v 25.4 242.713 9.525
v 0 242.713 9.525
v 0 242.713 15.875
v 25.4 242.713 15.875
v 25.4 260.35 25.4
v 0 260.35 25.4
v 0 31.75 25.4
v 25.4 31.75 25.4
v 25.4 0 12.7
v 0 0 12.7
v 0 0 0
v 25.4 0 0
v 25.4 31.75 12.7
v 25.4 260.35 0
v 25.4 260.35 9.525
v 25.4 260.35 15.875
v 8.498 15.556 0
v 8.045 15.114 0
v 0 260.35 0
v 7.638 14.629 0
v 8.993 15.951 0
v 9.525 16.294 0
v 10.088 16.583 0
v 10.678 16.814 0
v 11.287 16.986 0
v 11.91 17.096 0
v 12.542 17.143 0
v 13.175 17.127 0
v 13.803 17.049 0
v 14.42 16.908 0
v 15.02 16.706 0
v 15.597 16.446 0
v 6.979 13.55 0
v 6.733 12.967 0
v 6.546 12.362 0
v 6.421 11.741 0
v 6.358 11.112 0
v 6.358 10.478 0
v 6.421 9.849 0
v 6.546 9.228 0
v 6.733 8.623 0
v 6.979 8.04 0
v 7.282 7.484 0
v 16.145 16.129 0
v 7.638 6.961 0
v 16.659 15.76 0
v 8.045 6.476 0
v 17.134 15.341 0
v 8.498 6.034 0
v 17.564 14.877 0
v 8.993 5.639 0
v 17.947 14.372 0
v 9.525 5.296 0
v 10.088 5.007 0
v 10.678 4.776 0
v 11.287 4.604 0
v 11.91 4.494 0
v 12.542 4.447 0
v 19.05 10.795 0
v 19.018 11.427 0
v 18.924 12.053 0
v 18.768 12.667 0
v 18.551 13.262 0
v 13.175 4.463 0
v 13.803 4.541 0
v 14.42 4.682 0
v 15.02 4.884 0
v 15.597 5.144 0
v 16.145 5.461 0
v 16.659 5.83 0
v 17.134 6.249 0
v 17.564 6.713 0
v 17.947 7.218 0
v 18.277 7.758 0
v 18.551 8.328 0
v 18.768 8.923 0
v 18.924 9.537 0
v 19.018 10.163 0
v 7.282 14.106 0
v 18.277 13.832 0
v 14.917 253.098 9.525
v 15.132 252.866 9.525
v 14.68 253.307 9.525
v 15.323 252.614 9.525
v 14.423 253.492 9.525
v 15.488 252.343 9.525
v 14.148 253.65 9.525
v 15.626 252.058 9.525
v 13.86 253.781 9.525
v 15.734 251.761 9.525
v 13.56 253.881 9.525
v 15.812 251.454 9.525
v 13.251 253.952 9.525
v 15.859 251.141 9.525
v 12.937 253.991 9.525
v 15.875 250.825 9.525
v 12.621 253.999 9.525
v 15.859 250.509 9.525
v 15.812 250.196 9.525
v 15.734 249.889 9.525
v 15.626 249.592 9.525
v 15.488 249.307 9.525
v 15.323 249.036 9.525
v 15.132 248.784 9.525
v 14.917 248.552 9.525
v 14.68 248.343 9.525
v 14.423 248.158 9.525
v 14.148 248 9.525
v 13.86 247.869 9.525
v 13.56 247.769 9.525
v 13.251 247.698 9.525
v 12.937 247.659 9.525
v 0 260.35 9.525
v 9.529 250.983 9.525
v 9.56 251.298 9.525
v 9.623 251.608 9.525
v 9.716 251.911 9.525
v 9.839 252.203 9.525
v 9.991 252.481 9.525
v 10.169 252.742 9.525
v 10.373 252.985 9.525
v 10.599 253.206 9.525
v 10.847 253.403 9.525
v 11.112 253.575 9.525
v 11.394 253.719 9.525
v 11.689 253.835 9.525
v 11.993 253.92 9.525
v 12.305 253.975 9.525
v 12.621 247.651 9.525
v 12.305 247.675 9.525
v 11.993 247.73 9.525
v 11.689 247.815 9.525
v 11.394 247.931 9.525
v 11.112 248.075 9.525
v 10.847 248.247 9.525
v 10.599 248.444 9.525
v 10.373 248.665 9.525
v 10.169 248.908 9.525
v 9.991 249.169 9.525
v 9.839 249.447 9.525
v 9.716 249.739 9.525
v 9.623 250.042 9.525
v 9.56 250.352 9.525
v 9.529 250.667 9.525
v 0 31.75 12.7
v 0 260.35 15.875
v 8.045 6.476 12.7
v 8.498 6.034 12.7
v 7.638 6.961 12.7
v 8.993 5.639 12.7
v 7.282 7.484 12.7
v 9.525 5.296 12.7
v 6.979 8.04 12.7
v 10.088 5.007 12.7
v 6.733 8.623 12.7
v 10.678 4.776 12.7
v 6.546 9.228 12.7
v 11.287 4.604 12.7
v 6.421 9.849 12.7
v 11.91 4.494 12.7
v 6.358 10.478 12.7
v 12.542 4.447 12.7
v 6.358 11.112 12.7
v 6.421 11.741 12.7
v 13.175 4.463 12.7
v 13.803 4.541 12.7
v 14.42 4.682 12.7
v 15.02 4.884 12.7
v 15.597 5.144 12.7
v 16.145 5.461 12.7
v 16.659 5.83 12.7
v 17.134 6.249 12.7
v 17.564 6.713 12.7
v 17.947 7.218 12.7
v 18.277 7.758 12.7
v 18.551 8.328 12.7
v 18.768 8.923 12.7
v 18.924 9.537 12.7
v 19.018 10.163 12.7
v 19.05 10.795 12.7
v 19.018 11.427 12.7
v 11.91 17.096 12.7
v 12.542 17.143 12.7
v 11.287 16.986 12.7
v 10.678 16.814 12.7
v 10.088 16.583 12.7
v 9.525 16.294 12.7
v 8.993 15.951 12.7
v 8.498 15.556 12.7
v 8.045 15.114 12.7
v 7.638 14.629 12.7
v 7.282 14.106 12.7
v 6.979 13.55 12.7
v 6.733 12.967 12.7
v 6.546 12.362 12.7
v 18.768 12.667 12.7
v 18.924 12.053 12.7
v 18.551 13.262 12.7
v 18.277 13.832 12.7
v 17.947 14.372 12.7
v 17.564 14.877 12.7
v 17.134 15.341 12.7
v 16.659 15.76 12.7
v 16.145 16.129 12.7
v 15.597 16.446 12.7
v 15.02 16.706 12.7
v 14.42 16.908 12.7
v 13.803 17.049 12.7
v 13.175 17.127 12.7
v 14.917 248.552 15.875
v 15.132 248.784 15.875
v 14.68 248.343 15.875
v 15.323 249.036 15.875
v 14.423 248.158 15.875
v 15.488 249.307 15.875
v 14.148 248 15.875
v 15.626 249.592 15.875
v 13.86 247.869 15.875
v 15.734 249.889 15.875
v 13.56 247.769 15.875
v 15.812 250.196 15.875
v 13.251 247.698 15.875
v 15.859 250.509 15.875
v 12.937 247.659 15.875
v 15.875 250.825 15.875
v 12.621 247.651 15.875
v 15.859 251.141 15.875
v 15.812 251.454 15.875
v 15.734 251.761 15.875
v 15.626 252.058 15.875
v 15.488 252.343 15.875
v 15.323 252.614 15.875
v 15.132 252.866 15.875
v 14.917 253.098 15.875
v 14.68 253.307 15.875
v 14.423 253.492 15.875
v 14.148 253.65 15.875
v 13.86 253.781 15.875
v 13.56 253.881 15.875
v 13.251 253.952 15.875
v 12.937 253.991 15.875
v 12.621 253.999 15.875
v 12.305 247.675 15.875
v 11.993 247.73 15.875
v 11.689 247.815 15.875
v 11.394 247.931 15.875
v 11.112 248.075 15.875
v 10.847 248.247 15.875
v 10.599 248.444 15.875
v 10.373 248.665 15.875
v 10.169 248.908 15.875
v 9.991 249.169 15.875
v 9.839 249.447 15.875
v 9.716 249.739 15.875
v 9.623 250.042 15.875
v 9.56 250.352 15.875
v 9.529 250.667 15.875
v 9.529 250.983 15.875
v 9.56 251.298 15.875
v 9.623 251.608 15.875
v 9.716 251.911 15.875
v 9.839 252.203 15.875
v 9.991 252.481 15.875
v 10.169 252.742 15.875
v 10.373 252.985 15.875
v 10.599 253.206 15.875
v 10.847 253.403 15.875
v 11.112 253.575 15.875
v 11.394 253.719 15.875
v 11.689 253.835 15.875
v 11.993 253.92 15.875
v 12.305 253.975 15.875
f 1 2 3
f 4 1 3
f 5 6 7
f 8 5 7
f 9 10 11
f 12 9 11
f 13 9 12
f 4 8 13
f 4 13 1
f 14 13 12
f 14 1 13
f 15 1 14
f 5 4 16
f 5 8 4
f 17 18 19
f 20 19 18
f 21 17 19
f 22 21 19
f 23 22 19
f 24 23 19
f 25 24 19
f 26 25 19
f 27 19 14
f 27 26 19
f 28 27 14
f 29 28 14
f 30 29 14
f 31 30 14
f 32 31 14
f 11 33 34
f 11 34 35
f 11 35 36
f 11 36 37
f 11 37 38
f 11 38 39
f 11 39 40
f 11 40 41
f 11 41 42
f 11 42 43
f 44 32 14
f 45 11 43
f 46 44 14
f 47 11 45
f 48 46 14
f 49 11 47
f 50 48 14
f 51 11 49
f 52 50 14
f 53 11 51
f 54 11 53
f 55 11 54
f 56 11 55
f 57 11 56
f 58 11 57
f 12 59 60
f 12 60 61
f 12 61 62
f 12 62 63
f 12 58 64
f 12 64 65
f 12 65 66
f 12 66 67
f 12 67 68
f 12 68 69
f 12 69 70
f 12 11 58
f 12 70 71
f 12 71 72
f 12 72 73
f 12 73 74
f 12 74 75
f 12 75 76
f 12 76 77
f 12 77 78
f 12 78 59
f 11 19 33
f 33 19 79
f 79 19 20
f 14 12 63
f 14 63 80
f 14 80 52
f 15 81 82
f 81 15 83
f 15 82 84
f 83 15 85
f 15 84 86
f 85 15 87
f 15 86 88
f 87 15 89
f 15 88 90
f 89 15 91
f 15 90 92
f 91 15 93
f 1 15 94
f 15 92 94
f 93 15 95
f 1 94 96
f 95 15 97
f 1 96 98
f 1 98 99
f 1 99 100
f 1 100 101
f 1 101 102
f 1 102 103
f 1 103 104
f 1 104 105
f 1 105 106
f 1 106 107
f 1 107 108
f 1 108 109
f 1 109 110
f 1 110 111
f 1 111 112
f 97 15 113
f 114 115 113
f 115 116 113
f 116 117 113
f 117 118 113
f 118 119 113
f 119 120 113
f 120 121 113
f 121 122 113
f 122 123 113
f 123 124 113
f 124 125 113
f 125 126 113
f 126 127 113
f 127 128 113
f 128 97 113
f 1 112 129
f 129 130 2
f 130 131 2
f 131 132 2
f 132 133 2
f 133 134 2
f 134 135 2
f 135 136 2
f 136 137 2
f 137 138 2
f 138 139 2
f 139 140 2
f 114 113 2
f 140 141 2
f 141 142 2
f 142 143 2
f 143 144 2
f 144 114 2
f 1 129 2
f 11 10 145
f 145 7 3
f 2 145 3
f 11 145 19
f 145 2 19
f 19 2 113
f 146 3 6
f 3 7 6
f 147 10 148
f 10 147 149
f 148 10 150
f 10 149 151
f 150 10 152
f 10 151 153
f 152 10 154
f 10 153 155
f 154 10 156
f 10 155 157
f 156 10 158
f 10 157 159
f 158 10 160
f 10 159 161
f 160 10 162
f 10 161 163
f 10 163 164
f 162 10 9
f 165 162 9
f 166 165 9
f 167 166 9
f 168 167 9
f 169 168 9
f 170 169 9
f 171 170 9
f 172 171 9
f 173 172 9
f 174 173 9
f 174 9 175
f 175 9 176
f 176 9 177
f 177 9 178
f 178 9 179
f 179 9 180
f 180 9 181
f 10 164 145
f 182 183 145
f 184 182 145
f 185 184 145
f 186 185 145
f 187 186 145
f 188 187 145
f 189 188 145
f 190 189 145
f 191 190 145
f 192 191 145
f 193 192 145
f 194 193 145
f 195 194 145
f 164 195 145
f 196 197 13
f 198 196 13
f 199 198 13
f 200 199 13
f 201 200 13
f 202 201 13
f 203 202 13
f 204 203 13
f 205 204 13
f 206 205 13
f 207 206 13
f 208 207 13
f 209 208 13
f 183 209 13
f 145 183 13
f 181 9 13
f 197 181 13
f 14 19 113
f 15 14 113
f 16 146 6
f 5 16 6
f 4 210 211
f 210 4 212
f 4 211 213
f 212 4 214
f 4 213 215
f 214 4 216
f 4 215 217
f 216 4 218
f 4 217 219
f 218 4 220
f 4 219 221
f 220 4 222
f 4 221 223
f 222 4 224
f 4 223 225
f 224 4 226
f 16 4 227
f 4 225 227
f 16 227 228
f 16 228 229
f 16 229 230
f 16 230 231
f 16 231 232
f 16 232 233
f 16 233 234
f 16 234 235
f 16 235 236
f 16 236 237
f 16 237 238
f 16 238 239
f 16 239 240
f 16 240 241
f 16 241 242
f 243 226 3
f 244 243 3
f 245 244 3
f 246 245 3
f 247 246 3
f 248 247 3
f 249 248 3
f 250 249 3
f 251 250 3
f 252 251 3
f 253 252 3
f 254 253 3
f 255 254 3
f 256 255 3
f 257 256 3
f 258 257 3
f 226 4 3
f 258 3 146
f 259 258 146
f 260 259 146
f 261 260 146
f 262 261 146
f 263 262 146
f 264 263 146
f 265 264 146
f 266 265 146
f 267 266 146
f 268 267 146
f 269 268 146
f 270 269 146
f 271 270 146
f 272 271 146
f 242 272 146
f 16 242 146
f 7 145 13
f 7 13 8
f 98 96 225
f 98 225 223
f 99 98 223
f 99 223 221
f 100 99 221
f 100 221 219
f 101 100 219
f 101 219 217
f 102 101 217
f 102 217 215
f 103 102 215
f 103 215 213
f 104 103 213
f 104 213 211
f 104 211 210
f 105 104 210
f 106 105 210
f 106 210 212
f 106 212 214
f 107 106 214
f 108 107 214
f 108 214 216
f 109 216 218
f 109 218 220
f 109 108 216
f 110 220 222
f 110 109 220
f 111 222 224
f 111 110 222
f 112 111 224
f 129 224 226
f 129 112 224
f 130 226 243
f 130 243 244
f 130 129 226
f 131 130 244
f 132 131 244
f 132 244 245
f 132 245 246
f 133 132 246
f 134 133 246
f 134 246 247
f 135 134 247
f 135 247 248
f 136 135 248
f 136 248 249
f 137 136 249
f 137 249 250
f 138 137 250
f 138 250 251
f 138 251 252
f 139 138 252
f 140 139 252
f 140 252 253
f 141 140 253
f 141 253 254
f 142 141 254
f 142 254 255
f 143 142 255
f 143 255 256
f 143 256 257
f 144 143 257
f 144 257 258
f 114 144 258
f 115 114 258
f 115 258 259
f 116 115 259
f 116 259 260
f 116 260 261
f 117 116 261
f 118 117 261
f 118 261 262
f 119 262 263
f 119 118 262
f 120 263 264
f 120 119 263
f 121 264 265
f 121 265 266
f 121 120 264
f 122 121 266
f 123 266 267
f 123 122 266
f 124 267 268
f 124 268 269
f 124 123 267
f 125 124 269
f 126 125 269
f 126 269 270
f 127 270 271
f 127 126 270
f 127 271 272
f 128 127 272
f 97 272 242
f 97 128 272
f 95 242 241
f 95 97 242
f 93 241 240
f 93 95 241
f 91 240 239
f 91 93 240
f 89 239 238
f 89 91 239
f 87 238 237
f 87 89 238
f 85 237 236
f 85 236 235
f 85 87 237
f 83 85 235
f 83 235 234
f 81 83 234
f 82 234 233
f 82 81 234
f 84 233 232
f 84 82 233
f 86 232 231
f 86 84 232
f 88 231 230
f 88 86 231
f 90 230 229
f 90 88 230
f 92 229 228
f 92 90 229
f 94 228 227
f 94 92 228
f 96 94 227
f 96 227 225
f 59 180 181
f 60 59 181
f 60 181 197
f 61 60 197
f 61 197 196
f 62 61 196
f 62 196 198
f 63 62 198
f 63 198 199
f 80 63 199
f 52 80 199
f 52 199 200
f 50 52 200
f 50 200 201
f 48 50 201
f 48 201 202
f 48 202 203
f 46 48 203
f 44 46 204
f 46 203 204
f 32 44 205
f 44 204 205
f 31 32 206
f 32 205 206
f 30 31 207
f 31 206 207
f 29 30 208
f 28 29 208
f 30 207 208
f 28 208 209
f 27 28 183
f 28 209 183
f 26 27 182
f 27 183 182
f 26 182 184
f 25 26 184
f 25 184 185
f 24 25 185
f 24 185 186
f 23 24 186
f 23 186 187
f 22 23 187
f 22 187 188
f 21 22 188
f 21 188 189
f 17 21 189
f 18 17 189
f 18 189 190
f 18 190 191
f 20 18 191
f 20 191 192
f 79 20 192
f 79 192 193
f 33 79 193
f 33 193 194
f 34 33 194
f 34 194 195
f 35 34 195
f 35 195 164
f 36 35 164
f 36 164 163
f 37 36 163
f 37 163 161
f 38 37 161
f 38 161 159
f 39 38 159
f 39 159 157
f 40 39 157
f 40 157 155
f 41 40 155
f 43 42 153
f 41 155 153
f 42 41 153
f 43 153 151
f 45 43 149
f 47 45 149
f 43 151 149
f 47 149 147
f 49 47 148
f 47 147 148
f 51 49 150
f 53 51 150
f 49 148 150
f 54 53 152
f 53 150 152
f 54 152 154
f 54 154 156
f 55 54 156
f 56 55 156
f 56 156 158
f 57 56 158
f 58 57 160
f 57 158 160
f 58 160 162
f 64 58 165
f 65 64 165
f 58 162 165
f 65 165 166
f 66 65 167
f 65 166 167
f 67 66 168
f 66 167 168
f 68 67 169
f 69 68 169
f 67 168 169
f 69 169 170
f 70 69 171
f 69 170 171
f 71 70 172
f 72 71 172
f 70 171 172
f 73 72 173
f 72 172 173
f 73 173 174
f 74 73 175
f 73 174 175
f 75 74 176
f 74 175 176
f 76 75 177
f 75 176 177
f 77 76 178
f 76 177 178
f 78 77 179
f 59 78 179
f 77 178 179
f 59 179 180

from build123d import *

# Parameters (mm, degrees)
F1_DEPTH = 25.4
F2_W     = 31.75
F2_H     = 12.7
F3_DEPTH = 25.4
F4_R     = 3.175
F5_DEPTH = 25.4
F6_R     = 6.35
F7_DEPTH = 25.4


with BuildPart() as f1:
    # F0 (on Right) → F1 (new body)
    with BuildSketch(Plane.YZ):
        Polygon((0, 25.4), (0, 0), (260.35, 0), (260.35, 9.525), (242.712691, 9.525), (242.712691, 15.875), (260.35, 15.875), (260.35, 25.4), align=None)
    extrude(amount=F1_DEPTH)

    # F2 (on face) → F3 (cut)
    with BuildSketch(Plane.YZ.offset(25.4)):
        with Locations((15.875, 19.05)):
            Rectangle(F2_W, F2_H)
    extrude(amount=-F3_DEPTH, mode=Mode.SUBTRACT)

    # F4 (on face) → F5 (join)
    with BuildSketch(Plane(origin=(0, 0, 0), x_dir=(1, 0, 0), z_dir=(0, 0, -1))):
        with Locations((12.7, -250.825)):
            Circle(F4_R)
    extrude(amount=-F5_DEPTH)

    # F6 (on face) → F7 (cut)
    with BuildSketch(Plane.XY.offset(12.7)):
        with Locations((12.7, 10.795)):
            Circle(F6_R)
    extrude(amount=-F7_DEPTH, mode=Mode.SUBTRACT)


solid = f1.part
